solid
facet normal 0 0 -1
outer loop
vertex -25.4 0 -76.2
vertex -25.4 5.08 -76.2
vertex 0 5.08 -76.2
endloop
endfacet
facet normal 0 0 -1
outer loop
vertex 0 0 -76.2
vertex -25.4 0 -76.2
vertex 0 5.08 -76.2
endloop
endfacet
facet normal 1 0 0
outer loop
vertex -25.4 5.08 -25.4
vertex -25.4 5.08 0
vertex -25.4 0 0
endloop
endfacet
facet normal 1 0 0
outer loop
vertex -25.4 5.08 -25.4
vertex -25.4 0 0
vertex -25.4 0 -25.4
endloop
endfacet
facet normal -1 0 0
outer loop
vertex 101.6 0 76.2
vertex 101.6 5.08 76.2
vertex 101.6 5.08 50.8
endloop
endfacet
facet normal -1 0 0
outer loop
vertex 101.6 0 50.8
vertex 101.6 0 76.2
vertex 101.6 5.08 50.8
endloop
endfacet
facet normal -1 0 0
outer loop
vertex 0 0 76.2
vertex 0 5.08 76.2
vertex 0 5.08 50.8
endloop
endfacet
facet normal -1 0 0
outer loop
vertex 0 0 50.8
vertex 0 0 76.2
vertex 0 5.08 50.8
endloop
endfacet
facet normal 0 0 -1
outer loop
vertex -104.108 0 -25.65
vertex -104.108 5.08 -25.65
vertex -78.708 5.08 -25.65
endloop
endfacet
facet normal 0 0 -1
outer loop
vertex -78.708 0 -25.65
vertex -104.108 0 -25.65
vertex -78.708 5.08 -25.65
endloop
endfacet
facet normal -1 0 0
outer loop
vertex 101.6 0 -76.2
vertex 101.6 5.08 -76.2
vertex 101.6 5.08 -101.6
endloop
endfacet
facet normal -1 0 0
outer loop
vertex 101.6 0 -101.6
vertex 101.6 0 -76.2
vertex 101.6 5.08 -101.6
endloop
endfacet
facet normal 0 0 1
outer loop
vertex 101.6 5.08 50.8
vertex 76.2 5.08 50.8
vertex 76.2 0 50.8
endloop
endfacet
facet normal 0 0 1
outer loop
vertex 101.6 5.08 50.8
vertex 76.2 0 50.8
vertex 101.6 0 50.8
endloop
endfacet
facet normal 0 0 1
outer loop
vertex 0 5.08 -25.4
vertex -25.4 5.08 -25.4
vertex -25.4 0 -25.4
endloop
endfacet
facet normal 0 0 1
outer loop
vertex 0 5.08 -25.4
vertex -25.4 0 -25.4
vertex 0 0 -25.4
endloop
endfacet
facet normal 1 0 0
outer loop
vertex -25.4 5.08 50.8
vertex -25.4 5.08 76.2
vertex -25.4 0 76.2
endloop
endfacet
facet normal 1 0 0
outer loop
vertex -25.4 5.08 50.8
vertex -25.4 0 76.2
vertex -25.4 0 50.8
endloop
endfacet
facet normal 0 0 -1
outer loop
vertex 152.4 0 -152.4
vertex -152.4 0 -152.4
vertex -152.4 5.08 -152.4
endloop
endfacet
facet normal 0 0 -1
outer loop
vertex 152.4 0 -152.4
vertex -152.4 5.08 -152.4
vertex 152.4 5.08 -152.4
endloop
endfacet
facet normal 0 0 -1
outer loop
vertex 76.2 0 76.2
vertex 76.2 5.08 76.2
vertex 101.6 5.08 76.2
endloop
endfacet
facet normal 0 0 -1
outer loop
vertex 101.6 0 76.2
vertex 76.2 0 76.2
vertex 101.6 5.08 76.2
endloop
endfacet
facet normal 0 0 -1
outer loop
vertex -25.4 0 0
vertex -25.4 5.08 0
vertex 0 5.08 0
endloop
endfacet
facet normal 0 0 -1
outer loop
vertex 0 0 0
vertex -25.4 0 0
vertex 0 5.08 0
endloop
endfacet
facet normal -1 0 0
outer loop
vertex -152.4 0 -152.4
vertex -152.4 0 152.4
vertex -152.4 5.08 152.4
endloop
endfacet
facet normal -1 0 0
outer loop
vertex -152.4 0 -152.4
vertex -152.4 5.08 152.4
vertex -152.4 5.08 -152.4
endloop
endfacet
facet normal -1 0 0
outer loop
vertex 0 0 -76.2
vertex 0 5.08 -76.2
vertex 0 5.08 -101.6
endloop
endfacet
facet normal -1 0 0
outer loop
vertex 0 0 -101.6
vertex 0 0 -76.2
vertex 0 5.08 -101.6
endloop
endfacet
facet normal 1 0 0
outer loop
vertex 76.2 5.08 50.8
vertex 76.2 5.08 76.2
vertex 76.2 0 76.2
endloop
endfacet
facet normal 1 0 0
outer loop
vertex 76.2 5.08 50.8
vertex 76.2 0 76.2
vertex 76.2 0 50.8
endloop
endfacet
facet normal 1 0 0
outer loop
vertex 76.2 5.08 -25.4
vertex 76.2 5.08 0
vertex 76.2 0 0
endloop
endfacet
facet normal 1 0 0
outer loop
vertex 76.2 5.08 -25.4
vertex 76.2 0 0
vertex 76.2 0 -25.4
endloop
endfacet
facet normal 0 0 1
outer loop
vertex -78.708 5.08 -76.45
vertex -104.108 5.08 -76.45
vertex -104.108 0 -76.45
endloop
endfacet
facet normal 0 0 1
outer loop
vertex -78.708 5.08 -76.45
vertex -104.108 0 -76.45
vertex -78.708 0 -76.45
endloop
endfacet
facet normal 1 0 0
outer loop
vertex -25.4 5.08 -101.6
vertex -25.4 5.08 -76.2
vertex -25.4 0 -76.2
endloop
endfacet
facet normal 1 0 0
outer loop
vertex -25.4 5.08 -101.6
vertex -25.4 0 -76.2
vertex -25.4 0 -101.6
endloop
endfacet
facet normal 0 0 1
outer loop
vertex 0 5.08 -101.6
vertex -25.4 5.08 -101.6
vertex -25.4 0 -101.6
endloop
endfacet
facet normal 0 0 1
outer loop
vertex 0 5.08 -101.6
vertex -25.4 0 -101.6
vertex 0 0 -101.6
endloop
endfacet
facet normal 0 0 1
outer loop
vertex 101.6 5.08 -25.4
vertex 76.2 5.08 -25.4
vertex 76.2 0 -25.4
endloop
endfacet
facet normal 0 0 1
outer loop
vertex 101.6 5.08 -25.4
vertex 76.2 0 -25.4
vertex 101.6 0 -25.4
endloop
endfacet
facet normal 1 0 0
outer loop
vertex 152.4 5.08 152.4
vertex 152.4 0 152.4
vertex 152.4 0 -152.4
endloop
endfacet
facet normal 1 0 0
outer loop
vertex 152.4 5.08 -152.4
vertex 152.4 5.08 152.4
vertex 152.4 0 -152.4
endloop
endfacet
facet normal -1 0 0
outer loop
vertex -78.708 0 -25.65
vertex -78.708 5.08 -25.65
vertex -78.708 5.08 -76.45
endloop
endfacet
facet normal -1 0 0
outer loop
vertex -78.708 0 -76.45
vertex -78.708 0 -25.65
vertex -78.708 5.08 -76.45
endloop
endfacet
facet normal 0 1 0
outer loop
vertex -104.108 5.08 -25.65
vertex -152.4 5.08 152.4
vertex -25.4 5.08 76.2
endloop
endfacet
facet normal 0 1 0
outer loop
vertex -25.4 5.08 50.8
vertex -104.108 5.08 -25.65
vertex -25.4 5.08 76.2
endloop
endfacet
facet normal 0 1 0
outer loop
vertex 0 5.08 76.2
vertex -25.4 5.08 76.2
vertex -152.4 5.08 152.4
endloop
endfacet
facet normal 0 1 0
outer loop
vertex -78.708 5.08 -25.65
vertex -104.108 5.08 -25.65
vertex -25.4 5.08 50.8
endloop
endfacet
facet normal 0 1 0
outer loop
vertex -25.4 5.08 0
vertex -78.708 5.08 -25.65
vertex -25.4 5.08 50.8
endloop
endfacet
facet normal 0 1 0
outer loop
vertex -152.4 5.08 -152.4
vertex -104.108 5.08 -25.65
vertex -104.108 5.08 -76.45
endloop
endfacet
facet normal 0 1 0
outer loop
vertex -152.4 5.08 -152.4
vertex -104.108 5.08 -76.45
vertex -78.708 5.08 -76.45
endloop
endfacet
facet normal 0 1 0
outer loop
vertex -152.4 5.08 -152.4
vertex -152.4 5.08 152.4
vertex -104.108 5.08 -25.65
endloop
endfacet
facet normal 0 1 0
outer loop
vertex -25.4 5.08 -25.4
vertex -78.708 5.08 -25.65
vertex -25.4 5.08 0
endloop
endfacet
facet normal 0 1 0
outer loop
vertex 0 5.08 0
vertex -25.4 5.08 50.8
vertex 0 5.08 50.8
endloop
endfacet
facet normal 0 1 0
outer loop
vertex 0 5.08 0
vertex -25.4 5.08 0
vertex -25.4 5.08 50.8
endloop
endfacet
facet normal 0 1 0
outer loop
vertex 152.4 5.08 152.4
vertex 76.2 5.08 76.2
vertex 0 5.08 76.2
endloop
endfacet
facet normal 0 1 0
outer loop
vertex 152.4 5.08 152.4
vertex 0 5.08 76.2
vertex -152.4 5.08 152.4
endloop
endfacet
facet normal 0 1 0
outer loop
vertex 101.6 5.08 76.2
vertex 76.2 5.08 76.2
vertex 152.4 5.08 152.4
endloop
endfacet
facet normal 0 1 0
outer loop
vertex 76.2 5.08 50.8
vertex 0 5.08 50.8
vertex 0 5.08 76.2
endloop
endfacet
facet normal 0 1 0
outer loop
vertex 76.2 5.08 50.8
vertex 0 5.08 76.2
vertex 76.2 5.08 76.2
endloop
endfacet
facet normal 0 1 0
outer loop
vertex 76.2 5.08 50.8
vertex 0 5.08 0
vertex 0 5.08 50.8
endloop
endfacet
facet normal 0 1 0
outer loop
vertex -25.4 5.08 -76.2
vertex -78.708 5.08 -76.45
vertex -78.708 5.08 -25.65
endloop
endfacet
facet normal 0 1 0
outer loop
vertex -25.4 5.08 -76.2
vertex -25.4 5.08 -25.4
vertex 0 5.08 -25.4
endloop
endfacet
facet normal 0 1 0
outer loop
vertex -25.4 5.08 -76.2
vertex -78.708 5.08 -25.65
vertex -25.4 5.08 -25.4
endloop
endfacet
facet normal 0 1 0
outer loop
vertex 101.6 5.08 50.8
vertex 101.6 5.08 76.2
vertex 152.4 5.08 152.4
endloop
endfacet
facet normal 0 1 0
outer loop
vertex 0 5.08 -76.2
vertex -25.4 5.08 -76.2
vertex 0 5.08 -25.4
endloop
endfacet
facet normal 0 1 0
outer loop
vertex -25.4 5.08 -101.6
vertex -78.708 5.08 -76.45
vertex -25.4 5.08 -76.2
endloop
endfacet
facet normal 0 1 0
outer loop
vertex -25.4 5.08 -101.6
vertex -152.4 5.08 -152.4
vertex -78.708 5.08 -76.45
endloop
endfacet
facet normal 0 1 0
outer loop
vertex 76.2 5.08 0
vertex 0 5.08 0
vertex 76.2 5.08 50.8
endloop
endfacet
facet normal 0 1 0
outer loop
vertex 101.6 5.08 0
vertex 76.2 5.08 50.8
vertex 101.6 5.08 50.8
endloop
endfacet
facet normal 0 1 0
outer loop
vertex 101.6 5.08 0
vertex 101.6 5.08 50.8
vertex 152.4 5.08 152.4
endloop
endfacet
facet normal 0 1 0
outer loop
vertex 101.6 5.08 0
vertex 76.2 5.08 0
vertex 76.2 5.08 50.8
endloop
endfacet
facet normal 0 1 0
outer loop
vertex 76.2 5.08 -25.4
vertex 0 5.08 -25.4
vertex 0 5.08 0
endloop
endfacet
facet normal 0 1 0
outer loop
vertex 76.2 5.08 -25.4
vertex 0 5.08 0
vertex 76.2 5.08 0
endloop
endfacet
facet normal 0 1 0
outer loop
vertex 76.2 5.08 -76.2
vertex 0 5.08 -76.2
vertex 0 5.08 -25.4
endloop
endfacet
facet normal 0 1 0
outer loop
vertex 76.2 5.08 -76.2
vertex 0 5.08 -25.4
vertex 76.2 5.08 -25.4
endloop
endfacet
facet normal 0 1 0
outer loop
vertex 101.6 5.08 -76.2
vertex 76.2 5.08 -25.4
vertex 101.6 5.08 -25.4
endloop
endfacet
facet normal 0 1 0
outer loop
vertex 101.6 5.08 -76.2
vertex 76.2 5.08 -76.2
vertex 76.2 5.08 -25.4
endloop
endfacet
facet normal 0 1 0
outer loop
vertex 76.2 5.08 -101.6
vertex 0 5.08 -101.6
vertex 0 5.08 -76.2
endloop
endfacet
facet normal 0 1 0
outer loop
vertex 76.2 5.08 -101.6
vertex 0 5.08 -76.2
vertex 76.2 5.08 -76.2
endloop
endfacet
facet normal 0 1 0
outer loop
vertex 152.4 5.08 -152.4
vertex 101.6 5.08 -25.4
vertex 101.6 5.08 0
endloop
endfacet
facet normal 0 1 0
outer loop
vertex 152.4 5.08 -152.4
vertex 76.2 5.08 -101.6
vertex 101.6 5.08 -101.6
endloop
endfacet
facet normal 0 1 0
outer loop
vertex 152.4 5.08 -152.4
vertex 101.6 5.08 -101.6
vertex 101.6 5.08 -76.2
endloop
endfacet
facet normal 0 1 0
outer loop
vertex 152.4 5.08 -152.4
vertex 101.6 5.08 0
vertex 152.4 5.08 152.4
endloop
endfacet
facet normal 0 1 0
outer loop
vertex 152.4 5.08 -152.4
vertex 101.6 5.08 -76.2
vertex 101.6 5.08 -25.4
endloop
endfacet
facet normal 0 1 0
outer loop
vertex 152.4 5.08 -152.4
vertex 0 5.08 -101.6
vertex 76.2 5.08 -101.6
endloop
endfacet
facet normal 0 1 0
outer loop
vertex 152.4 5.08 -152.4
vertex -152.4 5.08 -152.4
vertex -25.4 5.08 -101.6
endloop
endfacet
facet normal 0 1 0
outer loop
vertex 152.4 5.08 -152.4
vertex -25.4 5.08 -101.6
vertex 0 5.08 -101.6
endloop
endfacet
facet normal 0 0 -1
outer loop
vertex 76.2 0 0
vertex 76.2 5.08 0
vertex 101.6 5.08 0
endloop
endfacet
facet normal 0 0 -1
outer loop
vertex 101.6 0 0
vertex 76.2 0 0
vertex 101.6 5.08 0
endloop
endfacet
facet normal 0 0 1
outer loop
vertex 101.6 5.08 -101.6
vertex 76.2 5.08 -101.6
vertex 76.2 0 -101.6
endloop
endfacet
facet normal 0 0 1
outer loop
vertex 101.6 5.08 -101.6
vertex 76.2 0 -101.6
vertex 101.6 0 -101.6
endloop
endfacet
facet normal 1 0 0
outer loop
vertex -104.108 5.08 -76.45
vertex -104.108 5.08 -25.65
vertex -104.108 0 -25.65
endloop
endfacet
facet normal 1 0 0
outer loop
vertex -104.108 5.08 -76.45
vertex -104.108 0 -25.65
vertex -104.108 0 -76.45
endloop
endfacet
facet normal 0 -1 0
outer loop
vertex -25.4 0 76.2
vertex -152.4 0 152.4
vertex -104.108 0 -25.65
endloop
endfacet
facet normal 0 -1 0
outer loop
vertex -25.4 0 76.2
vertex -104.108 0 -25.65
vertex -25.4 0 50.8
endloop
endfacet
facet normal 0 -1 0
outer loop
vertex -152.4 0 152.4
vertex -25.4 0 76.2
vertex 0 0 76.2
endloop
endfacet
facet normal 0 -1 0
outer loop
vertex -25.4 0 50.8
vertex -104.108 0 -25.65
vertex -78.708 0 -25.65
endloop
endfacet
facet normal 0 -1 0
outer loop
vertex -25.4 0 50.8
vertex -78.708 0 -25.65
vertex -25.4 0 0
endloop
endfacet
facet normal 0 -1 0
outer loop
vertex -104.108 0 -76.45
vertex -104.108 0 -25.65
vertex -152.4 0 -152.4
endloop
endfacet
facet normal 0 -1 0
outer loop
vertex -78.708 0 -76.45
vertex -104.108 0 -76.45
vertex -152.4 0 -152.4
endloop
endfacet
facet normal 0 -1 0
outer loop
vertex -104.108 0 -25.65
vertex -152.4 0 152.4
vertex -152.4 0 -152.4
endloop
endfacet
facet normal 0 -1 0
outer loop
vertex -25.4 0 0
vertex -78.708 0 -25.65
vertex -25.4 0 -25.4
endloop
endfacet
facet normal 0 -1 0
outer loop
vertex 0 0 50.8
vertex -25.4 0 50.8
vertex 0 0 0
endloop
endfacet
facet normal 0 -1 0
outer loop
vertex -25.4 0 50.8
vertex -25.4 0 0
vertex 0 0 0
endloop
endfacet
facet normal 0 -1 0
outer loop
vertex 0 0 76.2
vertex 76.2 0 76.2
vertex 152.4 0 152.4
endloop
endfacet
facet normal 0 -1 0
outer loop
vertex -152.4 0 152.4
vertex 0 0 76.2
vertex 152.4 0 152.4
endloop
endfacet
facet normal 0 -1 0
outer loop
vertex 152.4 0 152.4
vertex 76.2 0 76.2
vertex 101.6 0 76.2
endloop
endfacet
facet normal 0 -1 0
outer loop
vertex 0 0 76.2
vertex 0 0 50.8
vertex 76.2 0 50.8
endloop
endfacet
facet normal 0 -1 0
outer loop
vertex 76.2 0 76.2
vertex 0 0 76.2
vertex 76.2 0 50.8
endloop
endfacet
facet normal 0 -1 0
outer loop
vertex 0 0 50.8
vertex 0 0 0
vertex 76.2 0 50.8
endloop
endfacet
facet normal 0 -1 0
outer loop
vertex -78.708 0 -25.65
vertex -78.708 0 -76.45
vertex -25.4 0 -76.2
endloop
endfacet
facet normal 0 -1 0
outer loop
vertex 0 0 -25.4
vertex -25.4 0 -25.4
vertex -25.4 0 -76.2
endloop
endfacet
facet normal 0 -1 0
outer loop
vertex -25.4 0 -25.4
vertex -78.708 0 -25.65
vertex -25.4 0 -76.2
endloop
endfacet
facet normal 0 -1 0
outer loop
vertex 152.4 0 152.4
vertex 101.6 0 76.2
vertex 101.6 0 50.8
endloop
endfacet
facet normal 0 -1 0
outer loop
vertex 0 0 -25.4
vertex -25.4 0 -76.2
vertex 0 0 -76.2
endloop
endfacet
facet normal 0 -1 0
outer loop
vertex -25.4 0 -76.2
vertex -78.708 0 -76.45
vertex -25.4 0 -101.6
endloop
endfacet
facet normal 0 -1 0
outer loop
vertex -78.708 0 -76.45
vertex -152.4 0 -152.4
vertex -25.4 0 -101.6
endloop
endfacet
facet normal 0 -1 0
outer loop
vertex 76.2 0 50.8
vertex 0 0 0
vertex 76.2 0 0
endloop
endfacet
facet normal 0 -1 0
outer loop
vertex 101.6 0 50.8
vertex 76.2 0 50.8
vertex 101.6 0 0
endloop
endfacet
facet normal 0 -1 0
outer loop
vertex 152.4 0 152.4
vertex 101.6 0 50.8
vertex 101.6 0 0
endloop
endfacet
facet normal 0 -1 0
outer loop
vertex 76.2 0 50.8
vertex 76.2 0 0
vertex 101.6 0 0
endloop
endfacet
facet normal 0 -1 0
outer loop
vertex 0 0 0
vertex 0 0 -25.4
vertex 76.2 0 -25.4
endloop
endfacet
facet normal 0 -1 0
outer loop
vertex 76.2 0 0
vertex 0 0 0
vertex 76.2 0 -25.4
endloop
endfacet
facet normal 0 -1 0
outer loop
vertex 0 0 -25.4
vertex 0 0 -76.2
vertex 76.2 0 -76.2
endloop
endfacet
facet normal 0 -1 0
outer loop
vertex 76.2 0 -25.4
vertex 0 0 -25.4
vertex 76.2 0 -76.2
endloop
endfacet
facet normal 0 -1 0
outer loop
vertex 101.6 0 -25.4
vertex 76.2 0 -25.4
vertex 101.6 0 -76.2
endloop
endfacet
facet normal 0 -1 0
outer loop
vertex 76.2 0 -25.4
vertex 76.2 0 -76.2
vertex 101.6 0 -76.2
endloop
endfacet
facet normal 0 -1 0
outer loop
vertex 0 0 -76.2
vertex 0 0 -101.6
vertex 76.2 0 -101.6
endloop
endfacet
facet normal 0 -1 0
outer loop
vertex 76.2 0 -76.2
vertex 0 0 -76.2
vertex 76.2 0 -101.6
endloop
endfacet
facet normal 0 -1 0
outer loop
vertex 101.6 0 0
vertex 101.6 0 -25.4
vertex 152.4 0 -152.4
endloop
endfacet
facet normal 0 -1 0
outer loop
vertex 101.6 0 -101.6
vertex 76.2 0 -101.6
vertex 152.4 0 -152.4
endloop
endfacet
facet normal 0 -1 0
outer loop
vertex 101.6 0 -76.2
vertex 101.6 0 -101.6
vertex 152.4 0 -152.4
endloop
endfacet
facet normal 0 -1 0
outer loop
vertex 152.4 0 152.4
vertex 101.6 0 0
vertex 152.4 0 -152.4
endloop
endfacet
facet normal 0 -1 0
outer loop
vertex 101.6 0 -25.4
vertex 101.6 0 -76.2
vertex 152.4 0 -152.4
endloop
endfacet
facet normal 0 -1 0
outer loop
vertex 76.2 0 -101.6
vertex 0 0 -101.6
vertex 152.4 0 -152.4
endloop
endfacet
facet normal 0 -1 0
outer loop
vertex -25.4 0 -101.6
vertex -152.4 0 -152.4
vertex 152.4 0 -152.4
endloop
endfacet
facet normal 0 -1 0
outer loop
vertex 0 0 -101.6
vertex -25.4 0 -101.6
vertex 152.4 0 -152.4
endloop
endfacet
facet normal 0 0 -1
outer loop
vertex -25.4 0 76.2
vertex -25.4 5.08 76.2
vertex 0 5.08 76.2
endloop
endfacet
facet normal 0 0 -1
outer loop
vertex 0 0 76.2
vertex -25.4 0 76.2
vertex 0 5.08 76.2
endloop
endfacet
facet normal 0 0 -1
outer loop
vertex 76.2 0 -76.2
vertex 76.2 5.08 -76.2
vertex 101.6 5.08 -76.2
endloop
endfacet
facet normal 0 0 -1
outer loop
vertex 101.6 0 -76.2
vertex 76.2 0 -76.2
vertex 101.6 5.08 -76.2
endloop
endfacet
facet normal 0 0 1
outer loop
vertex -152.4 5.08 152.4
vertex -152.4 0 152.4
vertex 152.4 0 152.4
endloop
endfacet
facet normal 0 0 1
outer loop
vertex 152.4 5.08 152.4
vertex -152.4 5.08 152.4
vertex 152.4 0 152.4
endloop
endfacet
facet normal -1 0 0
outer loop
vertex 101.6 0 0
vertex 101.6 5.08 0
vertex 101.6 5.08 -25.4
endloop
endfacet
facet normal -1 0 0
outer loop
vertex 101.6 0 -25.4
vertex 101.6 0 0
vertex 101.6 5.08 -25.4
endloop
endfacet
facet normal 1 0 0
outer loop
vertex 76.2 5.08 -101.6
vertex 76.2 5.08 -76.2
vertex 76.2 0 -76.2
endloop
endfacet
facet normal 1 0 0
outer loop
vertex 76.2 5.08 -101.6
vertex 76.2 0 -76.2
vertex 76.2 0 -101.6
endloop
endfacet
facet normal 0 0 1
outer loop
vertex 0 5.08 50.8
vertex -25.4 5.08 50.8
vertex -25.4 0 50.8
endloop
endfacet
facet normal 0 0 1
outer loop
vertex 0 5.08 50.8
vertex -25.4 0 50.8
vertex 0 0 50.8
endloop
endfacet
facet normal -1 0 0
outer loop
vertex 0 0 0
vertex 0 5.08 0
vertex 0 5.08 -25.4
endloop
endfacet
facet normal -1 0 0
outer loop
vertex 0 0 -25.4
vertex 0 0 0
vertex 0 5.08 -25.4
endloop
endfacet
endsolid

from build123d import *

# Parameters (mm, degrees)
SKETCH1_W            = 304.8
SKETCH1_H            = 304.8
BOSS_EXTRUDE1_DEPTH  = 5.08
SKETCH2_W            = 25.4
SKETCH2_H            = 25.4
CUT_EXTRUDE1_DEPTH   = 5.08
LPATTERN1_COUNT      = 3
LPATTERN1_PITCH      = 76.2
LPATTERN1_COUNT_DIR2 = 2
LPATTERN1_PITCH_DIR2 = 101.6
SKETCH3_W            = 25.4
SKETCH3_H            = 50.8
CUT_EXTRUDE2_DEPTH   = 7.62


with BuildPart() as part:
    # Sketch1 → Boss-Extrude1 (new body)
    with BuildSketch(Plane(origin=(0, 0, 0), x_dir=(1, 0, 0), z_dir=(0, 1, 0))):
        Rectangle(SKETCH1_W, SKETCH1_H)
    extrude(amount=BOSS_EXTRUDE1_DEPTH)

    # Sketch2 → Cut-Extrude1 (cut)
    with BuildSketch(Plane(origin=(0, 5.08, 0), x_dir=(1, 0, 0), z_dir=(0, 1, 0))):
        with Locations((-12.7, 88.9)):
            Rectangle(SKETCH2_W, SKETCH2_H)
    cut_extrude1 = extrude(amount=-CUT_EXTRUDE1_DEPTH, mode=Mode.SUBTRACT)

    # LPattern1: Cut-Extrude1 3 × 2
    with Locations(*[(j * LPATTERN1_PITCH_DIR2, 0, i * LPATTERN1_PITCH) for i in range(LPATTERN1_COUNT) for j in range(LPATTERN1_COUNT_DIR2) if (i, j) != (0, 0)]):
        add(cut_extrude1, mode=Mode.SUBTRACT)

    # Sketch3 → Cut-Extrude2 (cut)
    with BuildSketch(Plane(origin=(0, 5.08, 0), x_dir=(1, 0, 0), z_dir=(0, 1, 0))):
        with Locations((-91.407513773, 51.049523057)):
            Rectangle(SKETCH3_W, SKETCH3_H)
    extrude(amount=-CUT_EXTRUDE2_DEPTH, mode=Mode.SUBTRACT)


solid = part.part
